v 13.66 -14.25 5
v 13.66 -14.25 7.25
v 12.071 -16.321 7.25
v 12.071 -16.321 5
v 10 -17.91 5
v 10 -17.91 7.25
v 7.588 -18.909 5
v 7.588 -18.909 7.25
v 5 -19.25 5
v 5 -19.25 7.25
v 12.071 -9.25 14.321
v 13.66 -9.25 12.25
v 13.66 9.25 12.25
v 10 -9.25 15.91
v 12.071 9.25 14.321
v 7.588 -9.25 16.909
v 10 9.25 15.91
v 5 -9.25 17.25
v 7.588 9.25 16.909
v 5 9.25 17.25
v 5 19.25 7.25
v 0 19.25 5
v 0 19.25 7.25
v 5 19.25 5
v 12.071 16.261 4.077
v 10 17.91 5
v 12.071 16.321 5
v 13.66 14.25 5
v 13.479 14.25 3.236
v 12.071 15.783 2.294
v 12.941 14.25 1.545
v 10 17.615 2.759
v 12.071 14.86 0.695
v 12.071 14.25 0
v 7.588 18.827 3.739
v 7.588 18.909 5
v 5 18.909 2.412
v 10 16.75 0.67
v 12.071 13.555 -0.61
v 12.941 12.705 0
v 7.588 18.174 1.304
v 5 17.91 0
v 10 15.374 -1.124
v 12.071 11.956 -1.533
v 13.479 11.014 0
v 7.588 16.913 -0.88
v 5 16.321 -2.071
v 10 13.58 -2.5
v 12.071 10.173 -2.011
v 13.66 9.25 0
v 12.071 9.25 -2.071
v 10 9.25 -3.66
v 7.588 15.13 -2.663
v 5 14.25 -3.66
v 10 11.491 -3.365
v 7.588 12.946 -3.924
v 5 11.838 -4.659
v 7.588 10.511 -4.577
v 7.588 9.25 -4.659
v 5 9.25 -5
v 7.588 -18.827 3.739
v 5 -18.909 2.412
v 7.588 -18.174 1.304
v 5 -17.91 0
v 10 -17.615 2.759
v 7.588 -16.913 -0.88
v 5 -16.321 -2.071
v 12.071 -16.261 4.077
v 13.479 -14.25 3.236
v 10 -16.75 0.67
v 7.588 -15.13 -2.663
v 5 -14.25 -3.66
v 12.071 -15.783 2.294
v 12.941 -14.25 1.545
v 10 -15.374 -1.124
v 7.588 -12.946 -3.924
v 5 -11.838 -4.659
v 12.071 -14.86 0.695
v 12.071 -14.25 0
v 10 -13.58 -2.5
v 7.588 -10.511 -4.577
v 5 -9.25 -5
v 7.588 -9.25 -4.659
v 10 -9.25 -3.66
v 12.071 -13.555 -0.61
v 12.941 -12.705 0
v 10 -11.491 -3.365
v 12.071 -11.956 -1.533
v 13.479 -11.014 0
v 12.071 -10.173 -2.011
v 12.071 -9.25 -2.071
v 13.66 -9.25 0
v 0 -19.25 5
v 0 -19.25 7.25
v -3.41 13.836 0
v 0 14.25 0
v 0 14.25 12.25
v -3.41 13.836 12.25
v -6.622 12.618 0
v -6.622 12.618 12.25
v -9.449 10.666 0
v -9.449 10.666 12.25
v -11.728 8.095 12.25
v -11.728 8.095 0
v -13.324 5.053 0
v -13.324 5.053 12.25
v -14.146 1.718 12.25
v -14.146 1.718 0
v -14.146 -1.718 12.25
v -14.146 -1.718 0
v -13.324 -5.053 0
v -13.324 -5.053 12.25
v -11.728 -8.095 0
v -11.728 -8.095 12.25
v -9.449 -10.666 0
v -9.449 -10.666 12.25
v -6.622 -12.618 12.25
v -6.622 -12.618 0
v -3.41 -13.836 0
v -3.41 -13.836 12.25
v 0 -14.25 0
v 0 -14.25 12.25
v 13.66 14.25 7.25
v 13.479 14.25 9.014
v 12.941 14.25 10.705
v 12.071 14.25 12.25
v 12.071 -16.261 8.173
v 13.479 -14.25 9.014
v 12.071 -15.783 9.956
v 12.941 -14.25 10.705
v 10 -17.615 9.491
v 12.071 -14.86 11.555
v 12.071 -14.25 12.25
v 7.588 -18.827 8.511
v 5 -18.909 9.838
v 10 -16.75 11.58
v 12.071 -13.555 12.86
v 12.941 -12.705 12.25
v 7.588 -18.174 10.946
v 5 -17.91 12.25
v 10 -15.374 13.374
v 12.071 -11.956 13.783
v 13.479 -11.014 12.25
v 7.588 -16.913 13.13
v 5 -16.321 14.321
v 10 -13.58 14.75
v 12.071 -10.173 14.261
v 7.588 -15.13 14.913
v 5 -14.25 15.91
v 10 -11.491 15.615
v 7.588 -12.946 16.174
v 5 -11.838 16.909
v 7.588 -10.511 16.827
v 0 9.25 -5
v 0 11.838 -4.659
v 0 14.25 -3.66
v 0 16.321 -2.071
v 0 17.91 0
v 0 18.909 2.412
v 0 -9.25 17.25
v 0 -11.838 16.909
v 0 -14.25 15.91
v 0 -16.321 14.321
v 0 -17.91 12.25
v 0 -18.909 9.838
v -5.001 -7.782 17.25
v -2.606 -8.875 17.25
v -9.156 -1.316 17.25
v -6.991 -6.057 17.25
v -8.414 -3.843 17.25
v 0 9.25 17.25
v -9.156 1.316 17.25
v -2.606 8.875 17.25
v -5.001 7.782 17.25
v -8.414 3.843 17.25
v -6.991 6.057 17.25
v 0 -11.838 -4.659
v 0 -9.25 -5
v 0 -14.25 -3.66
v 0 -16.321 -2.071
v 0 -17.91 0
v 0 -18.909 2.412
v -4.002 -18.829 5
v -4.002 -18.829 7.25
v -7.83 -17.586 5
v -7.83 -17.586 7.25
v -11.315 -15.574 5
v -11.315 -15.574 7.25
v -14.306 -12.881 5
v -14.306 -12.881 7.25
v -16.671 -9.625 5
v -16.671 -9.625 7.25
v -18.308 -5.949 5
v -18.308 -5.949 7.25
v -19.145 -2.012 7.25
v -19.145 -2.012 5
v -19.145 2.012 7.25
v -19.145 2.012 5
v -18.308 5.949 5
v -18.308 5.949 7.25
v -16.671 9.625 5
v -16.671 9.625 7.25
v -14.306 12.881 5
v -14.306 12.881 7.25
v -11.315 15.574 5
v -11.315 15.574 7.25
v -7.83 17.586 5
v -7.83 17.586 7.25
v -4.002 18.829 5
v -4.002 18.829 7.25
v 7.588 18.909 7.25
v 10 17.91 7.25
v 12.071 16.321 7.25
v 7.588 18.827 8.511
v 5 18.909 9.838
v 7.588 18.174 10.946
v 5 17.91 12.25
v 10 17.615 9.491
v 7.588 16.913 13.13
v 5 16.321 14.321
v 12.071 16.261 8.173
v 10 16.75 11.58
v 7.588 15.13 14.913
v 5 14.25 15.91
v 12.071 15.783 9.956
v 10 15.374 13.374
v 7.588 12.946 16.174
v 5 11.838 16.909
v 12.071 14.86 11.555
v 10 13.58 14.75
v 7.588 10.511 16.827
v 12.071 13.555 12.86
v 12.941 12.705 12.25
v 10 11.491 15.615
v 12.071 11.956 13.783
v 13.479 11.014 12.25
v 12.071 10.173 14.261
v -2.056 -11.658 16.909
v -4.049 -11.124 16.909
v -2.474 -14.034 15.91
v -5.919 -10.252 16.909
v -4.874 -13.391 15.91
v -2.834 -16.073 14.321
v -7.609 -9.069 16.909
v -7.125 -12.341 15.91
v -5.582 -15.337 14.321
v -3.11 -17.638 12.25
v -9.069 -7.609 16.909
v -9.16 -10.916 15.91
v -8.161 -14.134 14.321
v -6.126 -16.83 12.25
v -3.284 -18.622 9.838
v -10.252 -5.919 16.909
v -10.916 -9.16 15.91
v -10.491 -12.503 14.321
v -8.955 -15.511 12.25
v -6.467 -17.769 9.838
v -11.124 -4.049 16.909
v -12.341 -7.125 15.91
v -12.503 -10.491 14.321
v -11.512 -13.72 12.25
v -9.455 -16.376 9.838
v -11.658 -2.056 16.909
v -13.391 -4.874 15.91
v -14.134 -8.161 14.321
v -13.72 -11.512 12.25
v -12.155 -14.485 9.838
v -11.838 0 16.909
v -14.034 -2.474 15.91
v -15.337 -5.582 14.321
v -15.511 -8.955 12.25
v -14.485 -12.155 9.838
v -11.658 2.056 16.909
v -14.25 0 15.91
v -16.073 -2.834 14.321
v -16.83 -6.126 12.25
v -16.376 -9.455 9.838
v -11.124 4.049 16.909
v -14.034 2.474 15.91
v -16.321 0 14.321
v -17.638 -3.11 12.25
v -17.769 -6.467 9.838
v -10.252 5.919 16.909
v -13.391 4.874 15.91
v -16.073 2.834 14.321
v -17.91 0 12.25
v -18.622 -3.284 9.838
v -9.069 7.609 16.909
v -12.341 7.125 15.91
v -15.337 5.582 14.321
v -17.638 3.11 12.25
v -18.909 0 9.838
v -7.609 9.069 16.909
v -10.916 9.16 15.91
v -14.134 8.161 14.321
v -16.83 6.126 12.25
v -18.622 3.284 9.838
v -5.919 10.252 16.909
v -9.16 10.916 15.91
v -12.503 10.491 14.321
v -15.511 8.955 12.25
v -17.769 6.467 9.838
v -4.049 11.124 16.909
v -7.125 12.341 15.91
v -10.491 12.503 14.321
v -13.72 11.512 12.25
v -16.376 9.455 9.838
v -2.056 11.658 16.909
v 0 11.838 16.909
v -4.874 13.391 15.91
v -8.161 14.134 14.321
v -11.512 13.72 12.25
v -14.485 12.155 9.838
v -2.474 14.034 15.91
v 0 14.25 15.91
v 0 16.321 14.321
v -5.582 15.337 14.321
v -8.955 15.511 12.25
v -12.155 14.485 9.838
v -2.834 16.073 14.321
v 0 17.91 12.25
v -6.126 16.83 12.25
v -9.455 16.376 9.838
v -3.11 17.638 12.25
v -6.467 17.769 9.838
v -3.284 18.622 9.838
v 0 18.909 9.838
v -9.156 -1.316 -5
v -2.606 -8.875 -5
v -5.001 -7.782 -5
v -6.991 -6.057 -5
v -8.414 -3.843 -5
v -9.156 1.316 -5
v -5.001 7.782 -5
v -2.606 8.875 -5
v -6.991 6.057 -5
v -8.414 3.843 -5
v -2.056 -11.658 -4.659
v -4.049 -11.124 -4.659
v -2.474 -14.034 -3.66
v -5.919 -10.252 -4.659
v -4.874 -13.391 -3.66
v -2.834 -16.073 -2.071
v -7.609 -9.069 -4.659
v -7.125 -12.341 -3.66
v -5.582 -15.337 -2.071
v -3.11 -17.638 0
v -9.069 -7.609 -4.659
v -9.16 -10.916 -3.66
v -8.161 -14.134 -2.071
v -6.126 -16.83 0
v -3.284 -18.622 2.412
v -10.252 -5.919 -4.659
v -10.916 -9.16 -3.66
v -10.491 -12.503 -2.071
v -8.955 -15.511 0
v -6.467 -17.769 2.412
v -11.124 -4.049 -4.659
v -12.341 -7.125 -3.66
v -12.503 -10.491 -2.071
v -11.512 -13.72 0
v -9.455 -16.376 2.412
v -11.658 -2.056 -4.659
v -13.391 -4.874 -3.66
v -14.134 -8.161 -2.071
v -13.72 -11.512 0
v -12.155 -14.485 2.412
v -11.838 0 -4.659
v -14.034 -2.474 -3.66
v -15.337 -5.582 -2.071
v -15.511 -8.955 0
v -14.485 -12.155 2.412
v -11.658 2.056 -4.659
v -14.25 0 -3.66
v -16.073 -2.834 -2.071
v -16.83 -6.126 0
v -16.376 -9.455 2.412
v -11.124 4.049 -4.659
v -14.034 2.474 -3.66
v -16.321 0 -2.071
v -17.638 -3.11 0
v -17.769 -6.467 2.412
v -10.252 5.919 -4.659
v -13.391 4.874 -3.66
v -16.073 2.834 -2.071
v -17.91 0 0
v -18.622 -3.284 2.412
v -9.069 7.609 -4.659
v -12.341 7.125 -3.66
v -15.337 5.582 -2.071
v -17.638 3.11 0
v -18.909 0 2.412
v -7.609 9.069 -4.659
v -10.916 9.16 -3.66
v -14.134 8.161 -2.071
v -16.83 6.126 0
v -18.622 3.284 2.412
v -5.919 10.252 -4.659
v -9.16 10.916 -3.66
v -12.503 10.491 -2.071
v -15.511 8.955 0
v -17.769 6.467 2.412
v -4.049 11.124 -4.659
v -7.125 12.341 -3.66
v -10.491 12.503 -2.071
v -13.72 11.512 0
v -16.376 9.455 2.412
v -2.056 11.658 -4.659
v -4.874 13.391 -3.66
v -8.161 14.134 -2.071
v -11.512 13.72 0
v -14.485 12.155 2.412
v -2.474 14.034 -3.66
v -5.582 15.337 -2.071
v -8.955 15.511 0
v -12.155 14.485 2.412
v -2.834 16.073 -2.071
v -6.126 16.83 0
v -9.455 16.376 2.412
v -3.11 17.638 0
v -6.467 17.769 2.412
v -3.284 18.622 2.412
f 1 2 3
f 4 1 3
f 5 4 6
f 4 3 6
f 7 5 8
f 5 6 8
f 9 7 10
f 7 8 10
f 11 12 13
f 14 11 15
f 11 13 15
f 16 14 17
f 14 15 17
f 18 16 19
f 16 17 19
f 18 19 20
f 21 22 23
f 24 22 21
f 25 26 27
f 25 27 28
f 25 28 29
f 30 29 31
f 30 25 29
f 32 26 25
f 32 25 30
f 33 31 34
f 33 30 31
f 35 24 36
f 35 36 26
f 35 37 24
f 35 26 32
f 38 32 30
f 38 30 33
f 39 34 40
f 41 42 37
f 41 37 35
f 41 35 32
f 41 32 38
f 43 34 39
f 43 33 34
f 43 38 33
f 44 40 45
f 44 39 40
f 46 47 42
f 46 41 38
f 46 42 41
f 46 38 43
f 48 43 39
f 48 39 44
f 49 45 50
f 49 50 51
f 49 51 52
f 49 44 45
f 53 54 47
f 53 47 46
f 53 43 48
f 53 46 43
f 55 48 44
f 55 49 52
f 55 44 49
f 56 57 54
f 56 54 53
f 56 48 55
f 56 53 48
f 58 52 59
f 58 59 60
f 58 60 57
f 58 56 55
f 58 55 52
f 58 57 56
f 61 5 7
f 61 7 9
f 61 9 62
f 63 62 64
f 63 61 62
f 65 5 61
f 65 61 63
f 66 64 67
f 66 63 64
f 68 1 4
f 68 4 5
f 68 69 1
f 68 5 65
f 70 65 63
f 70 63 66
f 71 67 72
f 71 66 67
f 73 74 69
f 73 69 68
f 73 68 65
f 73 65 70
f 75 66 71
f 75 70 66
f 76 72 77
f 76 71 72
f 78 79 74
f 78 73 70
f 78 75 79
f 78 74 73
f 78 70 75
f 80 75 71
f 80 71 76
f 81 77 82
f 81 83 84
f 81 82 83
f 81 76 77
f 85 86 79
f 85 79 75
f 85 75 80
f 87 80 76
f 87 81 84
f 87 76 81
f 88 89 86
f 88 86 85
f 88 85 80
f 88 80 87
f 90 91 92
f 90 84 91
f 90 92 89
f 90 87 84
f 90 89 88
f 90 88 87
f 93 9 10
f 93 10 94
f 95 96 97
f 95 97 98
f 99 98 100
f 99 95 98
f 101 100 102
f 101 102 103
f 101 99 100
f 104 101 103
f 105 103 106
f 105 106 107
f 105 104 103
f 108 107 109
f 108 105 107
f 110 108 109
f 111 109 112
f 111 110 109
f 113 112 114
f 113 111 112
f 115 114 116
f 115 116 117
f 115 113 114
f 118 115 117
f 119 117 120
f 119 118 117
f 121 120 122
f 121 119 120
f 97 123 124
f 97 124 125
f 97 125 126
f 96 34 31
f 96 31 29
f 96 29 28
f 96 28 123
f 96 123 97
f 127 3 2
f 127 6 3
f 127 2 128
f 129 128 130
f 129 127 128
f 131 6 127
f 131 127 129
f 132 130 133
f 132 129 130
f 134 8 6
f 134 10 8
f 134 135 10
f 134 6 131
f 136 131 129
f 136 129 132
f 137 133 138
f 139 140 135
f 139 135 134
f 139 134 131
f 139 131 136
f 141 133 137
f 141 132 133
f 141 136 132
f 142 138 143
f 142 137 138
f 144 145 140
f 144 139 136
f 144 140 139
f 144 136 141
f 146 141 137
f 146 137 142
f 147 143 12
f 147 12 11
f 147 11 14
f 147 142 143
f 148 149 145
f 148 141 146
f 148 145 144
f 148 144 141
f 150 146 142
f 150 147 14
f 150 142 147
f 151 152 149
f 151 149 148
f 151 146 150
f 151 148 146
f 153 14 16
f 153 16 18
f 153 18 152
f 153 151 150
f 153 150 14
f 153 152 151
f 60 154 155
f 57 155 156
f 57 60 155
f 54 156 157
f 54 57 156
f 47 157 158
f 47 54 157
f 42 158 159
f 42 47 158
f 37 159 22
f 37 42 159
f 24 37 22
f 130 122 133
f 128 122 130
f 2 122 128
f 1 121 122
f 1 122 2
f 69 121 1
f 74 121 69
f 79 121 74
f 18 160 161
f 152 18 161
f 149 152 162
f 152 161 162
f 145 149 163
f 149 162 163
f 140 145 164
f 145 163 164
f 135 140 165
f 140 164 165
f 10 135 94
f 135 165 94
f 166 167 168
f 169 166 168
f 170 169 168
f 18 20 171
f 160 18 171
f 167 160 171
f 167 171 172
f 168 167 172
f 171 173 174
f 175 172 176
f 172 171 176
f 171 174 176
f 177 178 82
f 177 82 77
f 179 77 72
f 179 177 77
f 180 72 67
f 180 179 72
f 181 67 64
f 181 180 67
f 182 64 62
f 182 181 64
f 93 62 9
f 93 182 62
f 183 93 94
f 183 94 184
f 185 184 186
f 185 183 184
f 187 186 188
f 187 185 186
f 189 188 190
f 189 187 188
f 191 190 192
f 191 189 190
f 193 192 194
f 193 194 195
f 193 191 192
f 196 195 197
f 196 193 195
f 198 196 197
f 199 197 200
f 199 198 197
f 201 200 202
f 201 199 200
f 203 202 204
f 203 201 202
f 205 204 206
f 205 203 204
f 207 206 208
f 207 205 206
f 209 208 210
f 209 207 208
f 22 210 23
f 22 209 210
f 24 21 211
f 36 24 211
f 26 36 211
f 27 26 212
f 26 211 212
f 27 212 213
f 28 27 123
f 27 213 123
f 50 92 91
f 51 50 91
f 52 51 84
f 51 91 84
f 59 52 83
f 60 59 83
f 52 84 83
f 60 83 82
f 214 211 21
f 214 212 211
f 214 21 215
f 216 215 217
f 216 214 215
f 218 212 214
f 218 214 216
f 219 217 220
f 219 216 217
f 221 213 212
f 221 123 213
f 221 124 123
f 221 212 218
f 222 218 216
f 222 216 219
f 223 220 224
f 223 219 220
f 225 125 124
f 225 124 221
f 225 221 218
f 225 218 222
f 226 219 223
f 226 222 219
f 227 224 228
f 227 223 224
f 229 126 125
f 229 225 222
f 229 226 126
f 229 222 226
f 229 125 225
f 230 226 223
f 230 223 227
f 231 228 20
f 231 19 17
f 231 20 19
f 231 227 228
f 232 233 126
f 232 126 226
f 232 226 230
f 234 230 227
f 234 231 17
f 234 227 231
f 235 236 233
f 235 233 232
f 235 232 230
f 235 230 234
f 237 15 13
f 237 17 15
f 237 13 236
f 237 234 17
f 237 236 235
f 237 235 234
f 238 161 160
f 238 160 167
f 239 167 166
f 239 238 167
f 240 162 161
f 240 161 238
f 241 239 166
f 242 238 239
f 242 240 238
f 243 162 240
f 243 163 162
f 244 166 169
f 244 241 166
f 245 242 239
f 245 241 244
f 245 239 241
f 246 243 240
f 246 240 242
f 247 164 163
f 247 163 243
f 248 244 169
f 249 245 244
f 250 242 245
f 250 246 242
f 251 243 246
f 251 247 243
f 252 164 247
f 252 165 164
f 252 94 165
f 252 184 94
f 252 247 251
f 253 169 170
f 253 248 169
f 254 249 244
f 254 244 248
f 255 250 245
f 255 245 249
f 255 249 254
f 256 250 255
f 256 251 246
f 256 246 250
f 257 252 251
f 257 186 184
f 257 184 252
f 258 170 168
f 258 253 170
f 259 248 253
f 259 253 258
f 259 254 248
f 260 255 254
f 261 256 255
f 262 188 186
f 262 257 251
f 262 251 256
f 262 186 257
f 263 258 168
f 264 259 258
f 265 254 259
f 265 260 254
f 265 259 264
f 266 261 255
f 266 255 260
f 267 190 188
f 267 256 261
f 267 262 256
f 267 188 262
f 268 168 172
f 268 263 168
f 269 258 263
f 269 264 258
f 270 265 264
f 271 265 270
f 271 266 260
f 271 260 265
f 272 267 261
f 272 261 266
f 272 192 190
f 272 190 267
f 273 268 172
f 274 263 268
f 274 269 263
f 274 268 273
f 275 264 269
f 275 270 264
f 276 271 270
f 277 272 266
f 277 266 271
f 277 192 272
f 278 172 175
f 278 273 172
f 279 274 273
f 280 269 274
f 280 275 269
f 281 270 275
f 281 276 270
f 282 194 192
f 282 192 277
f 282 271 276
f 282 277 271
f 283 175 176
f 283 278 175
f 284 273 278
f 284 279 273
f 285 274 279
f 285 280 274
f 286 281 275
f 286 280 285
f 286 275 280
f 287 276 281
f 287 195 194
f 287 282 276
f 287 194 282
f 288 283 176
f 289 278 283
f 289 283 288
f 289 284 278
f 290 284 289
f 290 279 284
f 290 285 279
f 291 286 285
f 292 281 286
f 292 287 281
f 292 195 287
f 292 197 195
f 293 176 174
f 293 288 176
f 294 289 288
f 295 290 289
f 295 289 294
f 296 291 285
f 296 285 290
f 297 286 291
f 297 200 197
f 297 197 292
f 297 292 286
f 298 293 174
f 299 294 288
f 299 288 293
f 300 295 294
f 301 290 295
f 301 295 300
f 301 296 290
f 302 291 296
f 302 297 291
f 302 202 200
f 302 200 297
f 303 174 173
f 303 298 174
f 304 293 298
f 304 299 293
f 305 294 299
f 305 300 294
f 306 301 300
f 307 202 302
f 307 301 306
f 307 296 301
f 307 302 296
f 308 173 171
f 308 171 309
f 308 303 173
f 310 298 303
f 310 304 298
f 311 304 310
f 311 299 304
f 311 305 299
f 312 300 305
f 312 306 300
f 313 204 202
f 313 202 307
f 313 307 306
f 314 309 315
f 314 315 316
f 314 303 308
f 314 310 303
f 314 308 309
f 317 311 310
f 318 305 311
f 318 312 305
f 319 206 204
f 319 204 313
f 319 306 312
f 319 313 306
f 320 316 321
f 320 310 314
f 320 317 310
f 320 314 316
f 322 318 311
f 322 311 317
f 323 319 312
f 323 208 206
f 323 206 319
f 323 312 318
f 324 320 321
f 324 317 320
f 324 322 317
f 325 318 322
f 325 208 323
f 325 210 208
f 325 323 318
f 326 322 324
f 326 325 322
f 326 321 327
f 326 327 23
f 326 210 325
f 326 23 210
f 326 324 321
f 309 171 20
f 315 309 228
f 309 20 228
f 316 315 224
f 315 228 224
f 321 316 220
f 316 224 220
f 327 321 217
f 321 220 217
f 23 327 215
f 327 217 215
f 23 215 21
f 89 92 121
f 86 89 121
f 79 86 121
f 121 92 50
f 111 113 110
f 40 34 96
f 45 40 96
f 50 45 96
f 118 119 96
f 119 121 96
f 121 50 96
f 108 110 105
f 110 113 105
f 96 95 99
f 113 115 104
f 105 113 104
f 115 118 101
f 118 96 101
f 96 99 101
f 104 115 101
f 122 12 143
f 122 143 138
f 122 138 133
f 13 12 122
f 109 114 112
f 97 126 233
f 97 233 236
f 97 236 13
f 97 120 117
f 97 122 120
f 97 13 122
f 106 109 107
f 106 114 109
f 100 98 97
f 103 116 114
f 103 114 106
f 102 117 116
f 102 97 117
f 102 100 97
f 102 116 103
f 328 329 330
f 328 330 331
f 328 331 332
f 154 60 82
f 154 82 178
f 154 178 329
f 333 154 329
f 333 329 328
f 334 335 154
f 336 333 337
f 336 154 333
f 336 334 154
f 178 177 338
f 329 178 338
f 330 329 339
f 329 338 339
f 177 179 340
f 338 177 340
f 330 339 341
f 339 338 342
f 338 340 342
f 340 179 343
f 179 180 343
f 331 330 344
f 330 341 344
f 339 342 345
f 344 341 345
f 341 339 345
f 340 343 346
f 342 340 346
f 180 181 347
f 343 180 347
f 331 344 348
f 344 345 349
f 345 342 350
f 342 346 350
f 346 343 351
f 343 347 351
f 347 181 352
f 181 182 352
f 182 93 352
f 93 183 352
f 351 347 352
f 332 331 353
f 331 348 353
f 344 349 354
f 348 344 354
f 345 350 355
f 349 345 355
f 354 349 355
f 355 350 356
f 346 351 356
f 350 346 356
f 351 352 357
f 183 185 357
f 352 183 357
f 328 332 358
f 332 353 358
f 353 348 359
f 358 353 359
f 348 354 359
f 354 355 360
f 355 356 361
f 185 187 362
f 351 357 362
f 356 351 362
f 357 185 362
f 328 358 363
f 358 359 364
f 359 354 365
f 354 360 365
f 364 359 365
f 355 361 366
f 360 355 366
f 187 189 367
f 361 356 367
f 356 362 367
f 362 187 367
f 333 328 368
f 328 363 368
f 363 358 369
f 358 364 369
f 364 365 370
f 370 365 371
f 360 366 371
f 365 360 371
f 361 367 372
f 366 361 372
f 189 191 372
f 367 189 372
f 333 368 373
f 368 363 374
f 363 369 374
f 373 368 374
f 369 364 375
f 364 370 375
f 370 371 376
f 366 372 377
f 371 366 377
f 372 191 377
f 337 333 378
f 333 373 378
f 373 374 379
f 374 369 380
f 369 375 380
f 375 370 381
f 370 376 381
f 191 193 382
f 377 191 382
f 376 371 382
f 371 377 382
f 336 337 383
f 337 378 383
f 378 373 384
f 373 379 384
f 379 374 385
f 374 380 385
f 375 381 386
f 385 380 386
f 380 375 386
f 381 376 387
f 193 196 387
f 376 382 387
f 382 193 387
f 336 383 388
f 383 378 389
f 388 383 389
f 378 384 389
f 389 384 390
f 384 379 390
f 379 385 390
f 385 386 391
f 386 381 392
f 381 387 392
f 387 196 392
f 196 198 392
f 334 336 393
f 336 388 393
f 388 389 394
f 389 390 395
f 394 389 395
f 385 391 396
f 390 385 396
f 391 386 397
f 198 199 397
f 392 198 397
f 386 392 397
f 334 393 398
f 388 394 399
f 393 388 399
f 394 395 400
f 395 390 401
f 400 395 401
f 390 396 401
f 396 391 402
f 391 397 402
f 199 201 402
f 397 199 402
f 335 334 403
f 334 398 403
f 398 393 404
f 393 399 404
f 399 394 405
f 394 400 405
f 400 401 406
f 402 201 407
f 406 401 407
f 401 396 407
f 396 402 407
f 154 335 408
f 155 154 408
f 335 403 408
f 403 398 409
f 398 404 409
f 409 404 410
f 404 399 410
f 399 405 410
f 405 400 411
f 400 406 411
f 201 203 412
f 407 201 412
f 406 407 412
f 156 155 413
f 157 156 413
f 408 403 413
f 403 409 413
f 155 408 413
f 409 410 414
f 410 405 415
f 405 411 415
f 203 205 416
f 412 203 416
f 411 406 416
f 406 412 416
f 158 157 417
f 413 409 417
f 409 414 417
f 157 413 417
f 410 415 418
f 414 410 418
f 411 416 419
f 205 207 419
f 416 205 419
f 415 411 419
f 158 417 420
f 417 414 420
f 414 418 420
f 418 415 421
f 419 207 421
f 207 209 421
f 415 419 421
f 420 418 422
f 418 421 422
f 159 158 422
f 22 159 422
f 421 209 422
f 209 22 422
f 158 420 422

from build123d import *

# Parameters (mm, degrees)
BOSS_EXTRUDE1_DEPTH = 12.25
BOSS_EXTRUDE2_DEPTH = 5
LPATTERN1_COUNT     = 2
LPATTERN1_PITCH     = 17.25
FILLET11_R          = 10
FILLET12_R          = 10


with BuildPart() as part:
    # Sketch1 → Boss-Extrude1 (new body)
    with BuildSketch(Plane.XY):
        with BuildLine():
            Line((0, 19.25), (15, 19.25))
            Line((15, 19.25), (15, 14.25))
            Line((15, 14.25), (0, 14.25))
            ThreePointArc((0, 14.25), (-14.25, 0), (0, -14.25))
            Line((0, -14.25), (15, -14.25))
            Line((15, -14.25), (15, -19.25))
            Line((15, -19.25), (0, -19.25))
            ThreePointArc((0, -19.25), (-19.25, 0), (0, 19.25))
        make_face()
    extrude(amount=BOSS_EXTRUDE1_DEPTH)

    # Sketch2 → Boss-Extrude2 (add)
    with BuildSketch(Plane.XY.offset(12.25)):
        with BuildLine():
            Line((0, 19.25), (15, 19.25))
            Line((15, 19.25), (15, 14.25))
            Line((15, 14.25), (15, -14.25))
            Line((15, -14.25), (15, -19.25))
            Line((15, -19.25), (0, -19.25))
            ThreePointArc((0, -19.25), (-19.25, 0), (0, 19.25))
        make_face()
    boss_extrude2 = extrude(amount=BOSS_EXTRUDE2_DEPTH)

    # LPattern1: Boss-Extrude2 ×2
    with Locations(*[(0, 0, -i * LPATTERN1_PITCH) for i in range(1, LPATTERN1_COUNT)]):
        add(boss_extrude2)

    # Fillet11
    fillet11_edges = [part.edges().sort_by_distance(p)[0] for p in [
        (-19.25, 0, 17.25),
        (7.5, -19.25, 17.25),
        (7.5, 19.25, 17.25),
        (-19.25, 0, -5),
        (7.5, -19.25, -5),
        (7.5, 19.25, -5),
    ]]
    fillet(fillet11_edges, radius=FILLET11_R)

    # Fillet12
    # the kernel refuses this fillet: 10 mm, written as the material it takes off along each edge
    with BuildSketch(Plane(origin=(15, -9.25, 7.25), x_dir=(0, -1, 0), z_dir=(0, 0, -1))) as fillet12_piece_1:
        with BuildLine():
            CenterArc((10 - FILLET12_R, FILLET12_R), FILLET12_R, 270, 90)
            Line((10, FILLET12_R), (10, 0))
            Line((10, 0), (10 - FILLET12_R, 0))
        make_face()
    revolve(axis=Axis((15, -9.25, 7.25), (-1, 0, 0)), revolution_arc=90, mode=Mode.SUBTRACT)
    with BuildSketch(Plane(origin=(15, 9.25, 17.25), x_dir=(0, 0, -1), z_dir=(0, -1, 0)), Plane(origin=(15, -9.25, -5), x_dir=(0, 0, 1), z_dir=(0, 1, 0))) as fillet12_piece_2:
        with BuildLine():
            CenterArc((FILLET12_R, -FILLET12_R), FILLET12_R, 90, 90)
            Line((0, -FILLET12_R), (0, 0))
            Line((0, 0), (FILLET12_R, 0))
        make_face()
    extrude(amount=18.5, mode=Mode.SUBTRACT)
    with BuildSketch(Plane(origin=(15, 9.25, 7.25), x_dir=(0, 1, 0), z_dir=(0, 0, -1))) as fillet12_piece_3:
        with BuildLine():
            CenterArc((10 - FILLET12_R, -FILLET12_R), FILLET12_R, 360, 90)
            Line((10, -FILLET12_R), (10, 0))
            Line((10, 0), (10 - FILLET12_R, 0))
        make_face()
    revolve(axis=Axis((15, 9.25, 7.25), (1, 0, 0)), revolution_arc=90, mode=Mode.SUBTRACT)
    with BuildSketch(Plane(origin=(15, 19.25, 7.25), x_dir=(-1, 0, 0), z_dir=(0, 0, -1)), Plane(origin=(15, -19.25, 7.25), x_dir=(0, 1, 0), z_dir=(0, 0, -1))) as fillet12_piece_4:
        with BuildLine():
            CenterArc((FILLET12_R, -FILLET12_R), FILLET12_R, 90, 90)
            Line((0, -FILLET12_R), (0, 0))
            Line((0, 0), (FILLET12_R, 0))
        make_face()
    extrude(amount=2.25, mode=Mode.SUBTRACT)
    with BuildSketch(Plane(origin=(15, 9.25, 5), x_dir=(0, 1, 0), z_dir=(0, 0, 1))) as fillet12_piece_5:
        with BuildLine():
            CenterArc((10 - FILLET12_R, FILLET12_R), FILLET12_R, 270, 90)
            Line((10, FILLET12_R), (10, 0))
            Line((10, 0), (10 - FILLET12_R, 0))
        make_face()
    revolve(axis=Axis((15, 9.25, 5), (-1, 0, 0)), revolution_arc=90, mode=Mode.SUBTRACT)
    with BuildSketch(Plane(origin=(15, -9.25, 5), x_dir=(0, -1, 0), z_dir=(0, 0, 1))) as fillet12_piece_6:
        with BuildLine():
            CenterArc((10 - FILLET12_R, -FILLET12_R), FILLET12_R, 360, 90)
            Line((10, -FILLET12_R), (10, 0))
            Line((10, 0), (10 - FILLET12_R, 0))
        make_face()
    revolve(axis=Axis((15, -9.25, 5), (1, 0, 0)), revolution_arc=90, mode=Mode.SUBTRACT)


solid = part.part
